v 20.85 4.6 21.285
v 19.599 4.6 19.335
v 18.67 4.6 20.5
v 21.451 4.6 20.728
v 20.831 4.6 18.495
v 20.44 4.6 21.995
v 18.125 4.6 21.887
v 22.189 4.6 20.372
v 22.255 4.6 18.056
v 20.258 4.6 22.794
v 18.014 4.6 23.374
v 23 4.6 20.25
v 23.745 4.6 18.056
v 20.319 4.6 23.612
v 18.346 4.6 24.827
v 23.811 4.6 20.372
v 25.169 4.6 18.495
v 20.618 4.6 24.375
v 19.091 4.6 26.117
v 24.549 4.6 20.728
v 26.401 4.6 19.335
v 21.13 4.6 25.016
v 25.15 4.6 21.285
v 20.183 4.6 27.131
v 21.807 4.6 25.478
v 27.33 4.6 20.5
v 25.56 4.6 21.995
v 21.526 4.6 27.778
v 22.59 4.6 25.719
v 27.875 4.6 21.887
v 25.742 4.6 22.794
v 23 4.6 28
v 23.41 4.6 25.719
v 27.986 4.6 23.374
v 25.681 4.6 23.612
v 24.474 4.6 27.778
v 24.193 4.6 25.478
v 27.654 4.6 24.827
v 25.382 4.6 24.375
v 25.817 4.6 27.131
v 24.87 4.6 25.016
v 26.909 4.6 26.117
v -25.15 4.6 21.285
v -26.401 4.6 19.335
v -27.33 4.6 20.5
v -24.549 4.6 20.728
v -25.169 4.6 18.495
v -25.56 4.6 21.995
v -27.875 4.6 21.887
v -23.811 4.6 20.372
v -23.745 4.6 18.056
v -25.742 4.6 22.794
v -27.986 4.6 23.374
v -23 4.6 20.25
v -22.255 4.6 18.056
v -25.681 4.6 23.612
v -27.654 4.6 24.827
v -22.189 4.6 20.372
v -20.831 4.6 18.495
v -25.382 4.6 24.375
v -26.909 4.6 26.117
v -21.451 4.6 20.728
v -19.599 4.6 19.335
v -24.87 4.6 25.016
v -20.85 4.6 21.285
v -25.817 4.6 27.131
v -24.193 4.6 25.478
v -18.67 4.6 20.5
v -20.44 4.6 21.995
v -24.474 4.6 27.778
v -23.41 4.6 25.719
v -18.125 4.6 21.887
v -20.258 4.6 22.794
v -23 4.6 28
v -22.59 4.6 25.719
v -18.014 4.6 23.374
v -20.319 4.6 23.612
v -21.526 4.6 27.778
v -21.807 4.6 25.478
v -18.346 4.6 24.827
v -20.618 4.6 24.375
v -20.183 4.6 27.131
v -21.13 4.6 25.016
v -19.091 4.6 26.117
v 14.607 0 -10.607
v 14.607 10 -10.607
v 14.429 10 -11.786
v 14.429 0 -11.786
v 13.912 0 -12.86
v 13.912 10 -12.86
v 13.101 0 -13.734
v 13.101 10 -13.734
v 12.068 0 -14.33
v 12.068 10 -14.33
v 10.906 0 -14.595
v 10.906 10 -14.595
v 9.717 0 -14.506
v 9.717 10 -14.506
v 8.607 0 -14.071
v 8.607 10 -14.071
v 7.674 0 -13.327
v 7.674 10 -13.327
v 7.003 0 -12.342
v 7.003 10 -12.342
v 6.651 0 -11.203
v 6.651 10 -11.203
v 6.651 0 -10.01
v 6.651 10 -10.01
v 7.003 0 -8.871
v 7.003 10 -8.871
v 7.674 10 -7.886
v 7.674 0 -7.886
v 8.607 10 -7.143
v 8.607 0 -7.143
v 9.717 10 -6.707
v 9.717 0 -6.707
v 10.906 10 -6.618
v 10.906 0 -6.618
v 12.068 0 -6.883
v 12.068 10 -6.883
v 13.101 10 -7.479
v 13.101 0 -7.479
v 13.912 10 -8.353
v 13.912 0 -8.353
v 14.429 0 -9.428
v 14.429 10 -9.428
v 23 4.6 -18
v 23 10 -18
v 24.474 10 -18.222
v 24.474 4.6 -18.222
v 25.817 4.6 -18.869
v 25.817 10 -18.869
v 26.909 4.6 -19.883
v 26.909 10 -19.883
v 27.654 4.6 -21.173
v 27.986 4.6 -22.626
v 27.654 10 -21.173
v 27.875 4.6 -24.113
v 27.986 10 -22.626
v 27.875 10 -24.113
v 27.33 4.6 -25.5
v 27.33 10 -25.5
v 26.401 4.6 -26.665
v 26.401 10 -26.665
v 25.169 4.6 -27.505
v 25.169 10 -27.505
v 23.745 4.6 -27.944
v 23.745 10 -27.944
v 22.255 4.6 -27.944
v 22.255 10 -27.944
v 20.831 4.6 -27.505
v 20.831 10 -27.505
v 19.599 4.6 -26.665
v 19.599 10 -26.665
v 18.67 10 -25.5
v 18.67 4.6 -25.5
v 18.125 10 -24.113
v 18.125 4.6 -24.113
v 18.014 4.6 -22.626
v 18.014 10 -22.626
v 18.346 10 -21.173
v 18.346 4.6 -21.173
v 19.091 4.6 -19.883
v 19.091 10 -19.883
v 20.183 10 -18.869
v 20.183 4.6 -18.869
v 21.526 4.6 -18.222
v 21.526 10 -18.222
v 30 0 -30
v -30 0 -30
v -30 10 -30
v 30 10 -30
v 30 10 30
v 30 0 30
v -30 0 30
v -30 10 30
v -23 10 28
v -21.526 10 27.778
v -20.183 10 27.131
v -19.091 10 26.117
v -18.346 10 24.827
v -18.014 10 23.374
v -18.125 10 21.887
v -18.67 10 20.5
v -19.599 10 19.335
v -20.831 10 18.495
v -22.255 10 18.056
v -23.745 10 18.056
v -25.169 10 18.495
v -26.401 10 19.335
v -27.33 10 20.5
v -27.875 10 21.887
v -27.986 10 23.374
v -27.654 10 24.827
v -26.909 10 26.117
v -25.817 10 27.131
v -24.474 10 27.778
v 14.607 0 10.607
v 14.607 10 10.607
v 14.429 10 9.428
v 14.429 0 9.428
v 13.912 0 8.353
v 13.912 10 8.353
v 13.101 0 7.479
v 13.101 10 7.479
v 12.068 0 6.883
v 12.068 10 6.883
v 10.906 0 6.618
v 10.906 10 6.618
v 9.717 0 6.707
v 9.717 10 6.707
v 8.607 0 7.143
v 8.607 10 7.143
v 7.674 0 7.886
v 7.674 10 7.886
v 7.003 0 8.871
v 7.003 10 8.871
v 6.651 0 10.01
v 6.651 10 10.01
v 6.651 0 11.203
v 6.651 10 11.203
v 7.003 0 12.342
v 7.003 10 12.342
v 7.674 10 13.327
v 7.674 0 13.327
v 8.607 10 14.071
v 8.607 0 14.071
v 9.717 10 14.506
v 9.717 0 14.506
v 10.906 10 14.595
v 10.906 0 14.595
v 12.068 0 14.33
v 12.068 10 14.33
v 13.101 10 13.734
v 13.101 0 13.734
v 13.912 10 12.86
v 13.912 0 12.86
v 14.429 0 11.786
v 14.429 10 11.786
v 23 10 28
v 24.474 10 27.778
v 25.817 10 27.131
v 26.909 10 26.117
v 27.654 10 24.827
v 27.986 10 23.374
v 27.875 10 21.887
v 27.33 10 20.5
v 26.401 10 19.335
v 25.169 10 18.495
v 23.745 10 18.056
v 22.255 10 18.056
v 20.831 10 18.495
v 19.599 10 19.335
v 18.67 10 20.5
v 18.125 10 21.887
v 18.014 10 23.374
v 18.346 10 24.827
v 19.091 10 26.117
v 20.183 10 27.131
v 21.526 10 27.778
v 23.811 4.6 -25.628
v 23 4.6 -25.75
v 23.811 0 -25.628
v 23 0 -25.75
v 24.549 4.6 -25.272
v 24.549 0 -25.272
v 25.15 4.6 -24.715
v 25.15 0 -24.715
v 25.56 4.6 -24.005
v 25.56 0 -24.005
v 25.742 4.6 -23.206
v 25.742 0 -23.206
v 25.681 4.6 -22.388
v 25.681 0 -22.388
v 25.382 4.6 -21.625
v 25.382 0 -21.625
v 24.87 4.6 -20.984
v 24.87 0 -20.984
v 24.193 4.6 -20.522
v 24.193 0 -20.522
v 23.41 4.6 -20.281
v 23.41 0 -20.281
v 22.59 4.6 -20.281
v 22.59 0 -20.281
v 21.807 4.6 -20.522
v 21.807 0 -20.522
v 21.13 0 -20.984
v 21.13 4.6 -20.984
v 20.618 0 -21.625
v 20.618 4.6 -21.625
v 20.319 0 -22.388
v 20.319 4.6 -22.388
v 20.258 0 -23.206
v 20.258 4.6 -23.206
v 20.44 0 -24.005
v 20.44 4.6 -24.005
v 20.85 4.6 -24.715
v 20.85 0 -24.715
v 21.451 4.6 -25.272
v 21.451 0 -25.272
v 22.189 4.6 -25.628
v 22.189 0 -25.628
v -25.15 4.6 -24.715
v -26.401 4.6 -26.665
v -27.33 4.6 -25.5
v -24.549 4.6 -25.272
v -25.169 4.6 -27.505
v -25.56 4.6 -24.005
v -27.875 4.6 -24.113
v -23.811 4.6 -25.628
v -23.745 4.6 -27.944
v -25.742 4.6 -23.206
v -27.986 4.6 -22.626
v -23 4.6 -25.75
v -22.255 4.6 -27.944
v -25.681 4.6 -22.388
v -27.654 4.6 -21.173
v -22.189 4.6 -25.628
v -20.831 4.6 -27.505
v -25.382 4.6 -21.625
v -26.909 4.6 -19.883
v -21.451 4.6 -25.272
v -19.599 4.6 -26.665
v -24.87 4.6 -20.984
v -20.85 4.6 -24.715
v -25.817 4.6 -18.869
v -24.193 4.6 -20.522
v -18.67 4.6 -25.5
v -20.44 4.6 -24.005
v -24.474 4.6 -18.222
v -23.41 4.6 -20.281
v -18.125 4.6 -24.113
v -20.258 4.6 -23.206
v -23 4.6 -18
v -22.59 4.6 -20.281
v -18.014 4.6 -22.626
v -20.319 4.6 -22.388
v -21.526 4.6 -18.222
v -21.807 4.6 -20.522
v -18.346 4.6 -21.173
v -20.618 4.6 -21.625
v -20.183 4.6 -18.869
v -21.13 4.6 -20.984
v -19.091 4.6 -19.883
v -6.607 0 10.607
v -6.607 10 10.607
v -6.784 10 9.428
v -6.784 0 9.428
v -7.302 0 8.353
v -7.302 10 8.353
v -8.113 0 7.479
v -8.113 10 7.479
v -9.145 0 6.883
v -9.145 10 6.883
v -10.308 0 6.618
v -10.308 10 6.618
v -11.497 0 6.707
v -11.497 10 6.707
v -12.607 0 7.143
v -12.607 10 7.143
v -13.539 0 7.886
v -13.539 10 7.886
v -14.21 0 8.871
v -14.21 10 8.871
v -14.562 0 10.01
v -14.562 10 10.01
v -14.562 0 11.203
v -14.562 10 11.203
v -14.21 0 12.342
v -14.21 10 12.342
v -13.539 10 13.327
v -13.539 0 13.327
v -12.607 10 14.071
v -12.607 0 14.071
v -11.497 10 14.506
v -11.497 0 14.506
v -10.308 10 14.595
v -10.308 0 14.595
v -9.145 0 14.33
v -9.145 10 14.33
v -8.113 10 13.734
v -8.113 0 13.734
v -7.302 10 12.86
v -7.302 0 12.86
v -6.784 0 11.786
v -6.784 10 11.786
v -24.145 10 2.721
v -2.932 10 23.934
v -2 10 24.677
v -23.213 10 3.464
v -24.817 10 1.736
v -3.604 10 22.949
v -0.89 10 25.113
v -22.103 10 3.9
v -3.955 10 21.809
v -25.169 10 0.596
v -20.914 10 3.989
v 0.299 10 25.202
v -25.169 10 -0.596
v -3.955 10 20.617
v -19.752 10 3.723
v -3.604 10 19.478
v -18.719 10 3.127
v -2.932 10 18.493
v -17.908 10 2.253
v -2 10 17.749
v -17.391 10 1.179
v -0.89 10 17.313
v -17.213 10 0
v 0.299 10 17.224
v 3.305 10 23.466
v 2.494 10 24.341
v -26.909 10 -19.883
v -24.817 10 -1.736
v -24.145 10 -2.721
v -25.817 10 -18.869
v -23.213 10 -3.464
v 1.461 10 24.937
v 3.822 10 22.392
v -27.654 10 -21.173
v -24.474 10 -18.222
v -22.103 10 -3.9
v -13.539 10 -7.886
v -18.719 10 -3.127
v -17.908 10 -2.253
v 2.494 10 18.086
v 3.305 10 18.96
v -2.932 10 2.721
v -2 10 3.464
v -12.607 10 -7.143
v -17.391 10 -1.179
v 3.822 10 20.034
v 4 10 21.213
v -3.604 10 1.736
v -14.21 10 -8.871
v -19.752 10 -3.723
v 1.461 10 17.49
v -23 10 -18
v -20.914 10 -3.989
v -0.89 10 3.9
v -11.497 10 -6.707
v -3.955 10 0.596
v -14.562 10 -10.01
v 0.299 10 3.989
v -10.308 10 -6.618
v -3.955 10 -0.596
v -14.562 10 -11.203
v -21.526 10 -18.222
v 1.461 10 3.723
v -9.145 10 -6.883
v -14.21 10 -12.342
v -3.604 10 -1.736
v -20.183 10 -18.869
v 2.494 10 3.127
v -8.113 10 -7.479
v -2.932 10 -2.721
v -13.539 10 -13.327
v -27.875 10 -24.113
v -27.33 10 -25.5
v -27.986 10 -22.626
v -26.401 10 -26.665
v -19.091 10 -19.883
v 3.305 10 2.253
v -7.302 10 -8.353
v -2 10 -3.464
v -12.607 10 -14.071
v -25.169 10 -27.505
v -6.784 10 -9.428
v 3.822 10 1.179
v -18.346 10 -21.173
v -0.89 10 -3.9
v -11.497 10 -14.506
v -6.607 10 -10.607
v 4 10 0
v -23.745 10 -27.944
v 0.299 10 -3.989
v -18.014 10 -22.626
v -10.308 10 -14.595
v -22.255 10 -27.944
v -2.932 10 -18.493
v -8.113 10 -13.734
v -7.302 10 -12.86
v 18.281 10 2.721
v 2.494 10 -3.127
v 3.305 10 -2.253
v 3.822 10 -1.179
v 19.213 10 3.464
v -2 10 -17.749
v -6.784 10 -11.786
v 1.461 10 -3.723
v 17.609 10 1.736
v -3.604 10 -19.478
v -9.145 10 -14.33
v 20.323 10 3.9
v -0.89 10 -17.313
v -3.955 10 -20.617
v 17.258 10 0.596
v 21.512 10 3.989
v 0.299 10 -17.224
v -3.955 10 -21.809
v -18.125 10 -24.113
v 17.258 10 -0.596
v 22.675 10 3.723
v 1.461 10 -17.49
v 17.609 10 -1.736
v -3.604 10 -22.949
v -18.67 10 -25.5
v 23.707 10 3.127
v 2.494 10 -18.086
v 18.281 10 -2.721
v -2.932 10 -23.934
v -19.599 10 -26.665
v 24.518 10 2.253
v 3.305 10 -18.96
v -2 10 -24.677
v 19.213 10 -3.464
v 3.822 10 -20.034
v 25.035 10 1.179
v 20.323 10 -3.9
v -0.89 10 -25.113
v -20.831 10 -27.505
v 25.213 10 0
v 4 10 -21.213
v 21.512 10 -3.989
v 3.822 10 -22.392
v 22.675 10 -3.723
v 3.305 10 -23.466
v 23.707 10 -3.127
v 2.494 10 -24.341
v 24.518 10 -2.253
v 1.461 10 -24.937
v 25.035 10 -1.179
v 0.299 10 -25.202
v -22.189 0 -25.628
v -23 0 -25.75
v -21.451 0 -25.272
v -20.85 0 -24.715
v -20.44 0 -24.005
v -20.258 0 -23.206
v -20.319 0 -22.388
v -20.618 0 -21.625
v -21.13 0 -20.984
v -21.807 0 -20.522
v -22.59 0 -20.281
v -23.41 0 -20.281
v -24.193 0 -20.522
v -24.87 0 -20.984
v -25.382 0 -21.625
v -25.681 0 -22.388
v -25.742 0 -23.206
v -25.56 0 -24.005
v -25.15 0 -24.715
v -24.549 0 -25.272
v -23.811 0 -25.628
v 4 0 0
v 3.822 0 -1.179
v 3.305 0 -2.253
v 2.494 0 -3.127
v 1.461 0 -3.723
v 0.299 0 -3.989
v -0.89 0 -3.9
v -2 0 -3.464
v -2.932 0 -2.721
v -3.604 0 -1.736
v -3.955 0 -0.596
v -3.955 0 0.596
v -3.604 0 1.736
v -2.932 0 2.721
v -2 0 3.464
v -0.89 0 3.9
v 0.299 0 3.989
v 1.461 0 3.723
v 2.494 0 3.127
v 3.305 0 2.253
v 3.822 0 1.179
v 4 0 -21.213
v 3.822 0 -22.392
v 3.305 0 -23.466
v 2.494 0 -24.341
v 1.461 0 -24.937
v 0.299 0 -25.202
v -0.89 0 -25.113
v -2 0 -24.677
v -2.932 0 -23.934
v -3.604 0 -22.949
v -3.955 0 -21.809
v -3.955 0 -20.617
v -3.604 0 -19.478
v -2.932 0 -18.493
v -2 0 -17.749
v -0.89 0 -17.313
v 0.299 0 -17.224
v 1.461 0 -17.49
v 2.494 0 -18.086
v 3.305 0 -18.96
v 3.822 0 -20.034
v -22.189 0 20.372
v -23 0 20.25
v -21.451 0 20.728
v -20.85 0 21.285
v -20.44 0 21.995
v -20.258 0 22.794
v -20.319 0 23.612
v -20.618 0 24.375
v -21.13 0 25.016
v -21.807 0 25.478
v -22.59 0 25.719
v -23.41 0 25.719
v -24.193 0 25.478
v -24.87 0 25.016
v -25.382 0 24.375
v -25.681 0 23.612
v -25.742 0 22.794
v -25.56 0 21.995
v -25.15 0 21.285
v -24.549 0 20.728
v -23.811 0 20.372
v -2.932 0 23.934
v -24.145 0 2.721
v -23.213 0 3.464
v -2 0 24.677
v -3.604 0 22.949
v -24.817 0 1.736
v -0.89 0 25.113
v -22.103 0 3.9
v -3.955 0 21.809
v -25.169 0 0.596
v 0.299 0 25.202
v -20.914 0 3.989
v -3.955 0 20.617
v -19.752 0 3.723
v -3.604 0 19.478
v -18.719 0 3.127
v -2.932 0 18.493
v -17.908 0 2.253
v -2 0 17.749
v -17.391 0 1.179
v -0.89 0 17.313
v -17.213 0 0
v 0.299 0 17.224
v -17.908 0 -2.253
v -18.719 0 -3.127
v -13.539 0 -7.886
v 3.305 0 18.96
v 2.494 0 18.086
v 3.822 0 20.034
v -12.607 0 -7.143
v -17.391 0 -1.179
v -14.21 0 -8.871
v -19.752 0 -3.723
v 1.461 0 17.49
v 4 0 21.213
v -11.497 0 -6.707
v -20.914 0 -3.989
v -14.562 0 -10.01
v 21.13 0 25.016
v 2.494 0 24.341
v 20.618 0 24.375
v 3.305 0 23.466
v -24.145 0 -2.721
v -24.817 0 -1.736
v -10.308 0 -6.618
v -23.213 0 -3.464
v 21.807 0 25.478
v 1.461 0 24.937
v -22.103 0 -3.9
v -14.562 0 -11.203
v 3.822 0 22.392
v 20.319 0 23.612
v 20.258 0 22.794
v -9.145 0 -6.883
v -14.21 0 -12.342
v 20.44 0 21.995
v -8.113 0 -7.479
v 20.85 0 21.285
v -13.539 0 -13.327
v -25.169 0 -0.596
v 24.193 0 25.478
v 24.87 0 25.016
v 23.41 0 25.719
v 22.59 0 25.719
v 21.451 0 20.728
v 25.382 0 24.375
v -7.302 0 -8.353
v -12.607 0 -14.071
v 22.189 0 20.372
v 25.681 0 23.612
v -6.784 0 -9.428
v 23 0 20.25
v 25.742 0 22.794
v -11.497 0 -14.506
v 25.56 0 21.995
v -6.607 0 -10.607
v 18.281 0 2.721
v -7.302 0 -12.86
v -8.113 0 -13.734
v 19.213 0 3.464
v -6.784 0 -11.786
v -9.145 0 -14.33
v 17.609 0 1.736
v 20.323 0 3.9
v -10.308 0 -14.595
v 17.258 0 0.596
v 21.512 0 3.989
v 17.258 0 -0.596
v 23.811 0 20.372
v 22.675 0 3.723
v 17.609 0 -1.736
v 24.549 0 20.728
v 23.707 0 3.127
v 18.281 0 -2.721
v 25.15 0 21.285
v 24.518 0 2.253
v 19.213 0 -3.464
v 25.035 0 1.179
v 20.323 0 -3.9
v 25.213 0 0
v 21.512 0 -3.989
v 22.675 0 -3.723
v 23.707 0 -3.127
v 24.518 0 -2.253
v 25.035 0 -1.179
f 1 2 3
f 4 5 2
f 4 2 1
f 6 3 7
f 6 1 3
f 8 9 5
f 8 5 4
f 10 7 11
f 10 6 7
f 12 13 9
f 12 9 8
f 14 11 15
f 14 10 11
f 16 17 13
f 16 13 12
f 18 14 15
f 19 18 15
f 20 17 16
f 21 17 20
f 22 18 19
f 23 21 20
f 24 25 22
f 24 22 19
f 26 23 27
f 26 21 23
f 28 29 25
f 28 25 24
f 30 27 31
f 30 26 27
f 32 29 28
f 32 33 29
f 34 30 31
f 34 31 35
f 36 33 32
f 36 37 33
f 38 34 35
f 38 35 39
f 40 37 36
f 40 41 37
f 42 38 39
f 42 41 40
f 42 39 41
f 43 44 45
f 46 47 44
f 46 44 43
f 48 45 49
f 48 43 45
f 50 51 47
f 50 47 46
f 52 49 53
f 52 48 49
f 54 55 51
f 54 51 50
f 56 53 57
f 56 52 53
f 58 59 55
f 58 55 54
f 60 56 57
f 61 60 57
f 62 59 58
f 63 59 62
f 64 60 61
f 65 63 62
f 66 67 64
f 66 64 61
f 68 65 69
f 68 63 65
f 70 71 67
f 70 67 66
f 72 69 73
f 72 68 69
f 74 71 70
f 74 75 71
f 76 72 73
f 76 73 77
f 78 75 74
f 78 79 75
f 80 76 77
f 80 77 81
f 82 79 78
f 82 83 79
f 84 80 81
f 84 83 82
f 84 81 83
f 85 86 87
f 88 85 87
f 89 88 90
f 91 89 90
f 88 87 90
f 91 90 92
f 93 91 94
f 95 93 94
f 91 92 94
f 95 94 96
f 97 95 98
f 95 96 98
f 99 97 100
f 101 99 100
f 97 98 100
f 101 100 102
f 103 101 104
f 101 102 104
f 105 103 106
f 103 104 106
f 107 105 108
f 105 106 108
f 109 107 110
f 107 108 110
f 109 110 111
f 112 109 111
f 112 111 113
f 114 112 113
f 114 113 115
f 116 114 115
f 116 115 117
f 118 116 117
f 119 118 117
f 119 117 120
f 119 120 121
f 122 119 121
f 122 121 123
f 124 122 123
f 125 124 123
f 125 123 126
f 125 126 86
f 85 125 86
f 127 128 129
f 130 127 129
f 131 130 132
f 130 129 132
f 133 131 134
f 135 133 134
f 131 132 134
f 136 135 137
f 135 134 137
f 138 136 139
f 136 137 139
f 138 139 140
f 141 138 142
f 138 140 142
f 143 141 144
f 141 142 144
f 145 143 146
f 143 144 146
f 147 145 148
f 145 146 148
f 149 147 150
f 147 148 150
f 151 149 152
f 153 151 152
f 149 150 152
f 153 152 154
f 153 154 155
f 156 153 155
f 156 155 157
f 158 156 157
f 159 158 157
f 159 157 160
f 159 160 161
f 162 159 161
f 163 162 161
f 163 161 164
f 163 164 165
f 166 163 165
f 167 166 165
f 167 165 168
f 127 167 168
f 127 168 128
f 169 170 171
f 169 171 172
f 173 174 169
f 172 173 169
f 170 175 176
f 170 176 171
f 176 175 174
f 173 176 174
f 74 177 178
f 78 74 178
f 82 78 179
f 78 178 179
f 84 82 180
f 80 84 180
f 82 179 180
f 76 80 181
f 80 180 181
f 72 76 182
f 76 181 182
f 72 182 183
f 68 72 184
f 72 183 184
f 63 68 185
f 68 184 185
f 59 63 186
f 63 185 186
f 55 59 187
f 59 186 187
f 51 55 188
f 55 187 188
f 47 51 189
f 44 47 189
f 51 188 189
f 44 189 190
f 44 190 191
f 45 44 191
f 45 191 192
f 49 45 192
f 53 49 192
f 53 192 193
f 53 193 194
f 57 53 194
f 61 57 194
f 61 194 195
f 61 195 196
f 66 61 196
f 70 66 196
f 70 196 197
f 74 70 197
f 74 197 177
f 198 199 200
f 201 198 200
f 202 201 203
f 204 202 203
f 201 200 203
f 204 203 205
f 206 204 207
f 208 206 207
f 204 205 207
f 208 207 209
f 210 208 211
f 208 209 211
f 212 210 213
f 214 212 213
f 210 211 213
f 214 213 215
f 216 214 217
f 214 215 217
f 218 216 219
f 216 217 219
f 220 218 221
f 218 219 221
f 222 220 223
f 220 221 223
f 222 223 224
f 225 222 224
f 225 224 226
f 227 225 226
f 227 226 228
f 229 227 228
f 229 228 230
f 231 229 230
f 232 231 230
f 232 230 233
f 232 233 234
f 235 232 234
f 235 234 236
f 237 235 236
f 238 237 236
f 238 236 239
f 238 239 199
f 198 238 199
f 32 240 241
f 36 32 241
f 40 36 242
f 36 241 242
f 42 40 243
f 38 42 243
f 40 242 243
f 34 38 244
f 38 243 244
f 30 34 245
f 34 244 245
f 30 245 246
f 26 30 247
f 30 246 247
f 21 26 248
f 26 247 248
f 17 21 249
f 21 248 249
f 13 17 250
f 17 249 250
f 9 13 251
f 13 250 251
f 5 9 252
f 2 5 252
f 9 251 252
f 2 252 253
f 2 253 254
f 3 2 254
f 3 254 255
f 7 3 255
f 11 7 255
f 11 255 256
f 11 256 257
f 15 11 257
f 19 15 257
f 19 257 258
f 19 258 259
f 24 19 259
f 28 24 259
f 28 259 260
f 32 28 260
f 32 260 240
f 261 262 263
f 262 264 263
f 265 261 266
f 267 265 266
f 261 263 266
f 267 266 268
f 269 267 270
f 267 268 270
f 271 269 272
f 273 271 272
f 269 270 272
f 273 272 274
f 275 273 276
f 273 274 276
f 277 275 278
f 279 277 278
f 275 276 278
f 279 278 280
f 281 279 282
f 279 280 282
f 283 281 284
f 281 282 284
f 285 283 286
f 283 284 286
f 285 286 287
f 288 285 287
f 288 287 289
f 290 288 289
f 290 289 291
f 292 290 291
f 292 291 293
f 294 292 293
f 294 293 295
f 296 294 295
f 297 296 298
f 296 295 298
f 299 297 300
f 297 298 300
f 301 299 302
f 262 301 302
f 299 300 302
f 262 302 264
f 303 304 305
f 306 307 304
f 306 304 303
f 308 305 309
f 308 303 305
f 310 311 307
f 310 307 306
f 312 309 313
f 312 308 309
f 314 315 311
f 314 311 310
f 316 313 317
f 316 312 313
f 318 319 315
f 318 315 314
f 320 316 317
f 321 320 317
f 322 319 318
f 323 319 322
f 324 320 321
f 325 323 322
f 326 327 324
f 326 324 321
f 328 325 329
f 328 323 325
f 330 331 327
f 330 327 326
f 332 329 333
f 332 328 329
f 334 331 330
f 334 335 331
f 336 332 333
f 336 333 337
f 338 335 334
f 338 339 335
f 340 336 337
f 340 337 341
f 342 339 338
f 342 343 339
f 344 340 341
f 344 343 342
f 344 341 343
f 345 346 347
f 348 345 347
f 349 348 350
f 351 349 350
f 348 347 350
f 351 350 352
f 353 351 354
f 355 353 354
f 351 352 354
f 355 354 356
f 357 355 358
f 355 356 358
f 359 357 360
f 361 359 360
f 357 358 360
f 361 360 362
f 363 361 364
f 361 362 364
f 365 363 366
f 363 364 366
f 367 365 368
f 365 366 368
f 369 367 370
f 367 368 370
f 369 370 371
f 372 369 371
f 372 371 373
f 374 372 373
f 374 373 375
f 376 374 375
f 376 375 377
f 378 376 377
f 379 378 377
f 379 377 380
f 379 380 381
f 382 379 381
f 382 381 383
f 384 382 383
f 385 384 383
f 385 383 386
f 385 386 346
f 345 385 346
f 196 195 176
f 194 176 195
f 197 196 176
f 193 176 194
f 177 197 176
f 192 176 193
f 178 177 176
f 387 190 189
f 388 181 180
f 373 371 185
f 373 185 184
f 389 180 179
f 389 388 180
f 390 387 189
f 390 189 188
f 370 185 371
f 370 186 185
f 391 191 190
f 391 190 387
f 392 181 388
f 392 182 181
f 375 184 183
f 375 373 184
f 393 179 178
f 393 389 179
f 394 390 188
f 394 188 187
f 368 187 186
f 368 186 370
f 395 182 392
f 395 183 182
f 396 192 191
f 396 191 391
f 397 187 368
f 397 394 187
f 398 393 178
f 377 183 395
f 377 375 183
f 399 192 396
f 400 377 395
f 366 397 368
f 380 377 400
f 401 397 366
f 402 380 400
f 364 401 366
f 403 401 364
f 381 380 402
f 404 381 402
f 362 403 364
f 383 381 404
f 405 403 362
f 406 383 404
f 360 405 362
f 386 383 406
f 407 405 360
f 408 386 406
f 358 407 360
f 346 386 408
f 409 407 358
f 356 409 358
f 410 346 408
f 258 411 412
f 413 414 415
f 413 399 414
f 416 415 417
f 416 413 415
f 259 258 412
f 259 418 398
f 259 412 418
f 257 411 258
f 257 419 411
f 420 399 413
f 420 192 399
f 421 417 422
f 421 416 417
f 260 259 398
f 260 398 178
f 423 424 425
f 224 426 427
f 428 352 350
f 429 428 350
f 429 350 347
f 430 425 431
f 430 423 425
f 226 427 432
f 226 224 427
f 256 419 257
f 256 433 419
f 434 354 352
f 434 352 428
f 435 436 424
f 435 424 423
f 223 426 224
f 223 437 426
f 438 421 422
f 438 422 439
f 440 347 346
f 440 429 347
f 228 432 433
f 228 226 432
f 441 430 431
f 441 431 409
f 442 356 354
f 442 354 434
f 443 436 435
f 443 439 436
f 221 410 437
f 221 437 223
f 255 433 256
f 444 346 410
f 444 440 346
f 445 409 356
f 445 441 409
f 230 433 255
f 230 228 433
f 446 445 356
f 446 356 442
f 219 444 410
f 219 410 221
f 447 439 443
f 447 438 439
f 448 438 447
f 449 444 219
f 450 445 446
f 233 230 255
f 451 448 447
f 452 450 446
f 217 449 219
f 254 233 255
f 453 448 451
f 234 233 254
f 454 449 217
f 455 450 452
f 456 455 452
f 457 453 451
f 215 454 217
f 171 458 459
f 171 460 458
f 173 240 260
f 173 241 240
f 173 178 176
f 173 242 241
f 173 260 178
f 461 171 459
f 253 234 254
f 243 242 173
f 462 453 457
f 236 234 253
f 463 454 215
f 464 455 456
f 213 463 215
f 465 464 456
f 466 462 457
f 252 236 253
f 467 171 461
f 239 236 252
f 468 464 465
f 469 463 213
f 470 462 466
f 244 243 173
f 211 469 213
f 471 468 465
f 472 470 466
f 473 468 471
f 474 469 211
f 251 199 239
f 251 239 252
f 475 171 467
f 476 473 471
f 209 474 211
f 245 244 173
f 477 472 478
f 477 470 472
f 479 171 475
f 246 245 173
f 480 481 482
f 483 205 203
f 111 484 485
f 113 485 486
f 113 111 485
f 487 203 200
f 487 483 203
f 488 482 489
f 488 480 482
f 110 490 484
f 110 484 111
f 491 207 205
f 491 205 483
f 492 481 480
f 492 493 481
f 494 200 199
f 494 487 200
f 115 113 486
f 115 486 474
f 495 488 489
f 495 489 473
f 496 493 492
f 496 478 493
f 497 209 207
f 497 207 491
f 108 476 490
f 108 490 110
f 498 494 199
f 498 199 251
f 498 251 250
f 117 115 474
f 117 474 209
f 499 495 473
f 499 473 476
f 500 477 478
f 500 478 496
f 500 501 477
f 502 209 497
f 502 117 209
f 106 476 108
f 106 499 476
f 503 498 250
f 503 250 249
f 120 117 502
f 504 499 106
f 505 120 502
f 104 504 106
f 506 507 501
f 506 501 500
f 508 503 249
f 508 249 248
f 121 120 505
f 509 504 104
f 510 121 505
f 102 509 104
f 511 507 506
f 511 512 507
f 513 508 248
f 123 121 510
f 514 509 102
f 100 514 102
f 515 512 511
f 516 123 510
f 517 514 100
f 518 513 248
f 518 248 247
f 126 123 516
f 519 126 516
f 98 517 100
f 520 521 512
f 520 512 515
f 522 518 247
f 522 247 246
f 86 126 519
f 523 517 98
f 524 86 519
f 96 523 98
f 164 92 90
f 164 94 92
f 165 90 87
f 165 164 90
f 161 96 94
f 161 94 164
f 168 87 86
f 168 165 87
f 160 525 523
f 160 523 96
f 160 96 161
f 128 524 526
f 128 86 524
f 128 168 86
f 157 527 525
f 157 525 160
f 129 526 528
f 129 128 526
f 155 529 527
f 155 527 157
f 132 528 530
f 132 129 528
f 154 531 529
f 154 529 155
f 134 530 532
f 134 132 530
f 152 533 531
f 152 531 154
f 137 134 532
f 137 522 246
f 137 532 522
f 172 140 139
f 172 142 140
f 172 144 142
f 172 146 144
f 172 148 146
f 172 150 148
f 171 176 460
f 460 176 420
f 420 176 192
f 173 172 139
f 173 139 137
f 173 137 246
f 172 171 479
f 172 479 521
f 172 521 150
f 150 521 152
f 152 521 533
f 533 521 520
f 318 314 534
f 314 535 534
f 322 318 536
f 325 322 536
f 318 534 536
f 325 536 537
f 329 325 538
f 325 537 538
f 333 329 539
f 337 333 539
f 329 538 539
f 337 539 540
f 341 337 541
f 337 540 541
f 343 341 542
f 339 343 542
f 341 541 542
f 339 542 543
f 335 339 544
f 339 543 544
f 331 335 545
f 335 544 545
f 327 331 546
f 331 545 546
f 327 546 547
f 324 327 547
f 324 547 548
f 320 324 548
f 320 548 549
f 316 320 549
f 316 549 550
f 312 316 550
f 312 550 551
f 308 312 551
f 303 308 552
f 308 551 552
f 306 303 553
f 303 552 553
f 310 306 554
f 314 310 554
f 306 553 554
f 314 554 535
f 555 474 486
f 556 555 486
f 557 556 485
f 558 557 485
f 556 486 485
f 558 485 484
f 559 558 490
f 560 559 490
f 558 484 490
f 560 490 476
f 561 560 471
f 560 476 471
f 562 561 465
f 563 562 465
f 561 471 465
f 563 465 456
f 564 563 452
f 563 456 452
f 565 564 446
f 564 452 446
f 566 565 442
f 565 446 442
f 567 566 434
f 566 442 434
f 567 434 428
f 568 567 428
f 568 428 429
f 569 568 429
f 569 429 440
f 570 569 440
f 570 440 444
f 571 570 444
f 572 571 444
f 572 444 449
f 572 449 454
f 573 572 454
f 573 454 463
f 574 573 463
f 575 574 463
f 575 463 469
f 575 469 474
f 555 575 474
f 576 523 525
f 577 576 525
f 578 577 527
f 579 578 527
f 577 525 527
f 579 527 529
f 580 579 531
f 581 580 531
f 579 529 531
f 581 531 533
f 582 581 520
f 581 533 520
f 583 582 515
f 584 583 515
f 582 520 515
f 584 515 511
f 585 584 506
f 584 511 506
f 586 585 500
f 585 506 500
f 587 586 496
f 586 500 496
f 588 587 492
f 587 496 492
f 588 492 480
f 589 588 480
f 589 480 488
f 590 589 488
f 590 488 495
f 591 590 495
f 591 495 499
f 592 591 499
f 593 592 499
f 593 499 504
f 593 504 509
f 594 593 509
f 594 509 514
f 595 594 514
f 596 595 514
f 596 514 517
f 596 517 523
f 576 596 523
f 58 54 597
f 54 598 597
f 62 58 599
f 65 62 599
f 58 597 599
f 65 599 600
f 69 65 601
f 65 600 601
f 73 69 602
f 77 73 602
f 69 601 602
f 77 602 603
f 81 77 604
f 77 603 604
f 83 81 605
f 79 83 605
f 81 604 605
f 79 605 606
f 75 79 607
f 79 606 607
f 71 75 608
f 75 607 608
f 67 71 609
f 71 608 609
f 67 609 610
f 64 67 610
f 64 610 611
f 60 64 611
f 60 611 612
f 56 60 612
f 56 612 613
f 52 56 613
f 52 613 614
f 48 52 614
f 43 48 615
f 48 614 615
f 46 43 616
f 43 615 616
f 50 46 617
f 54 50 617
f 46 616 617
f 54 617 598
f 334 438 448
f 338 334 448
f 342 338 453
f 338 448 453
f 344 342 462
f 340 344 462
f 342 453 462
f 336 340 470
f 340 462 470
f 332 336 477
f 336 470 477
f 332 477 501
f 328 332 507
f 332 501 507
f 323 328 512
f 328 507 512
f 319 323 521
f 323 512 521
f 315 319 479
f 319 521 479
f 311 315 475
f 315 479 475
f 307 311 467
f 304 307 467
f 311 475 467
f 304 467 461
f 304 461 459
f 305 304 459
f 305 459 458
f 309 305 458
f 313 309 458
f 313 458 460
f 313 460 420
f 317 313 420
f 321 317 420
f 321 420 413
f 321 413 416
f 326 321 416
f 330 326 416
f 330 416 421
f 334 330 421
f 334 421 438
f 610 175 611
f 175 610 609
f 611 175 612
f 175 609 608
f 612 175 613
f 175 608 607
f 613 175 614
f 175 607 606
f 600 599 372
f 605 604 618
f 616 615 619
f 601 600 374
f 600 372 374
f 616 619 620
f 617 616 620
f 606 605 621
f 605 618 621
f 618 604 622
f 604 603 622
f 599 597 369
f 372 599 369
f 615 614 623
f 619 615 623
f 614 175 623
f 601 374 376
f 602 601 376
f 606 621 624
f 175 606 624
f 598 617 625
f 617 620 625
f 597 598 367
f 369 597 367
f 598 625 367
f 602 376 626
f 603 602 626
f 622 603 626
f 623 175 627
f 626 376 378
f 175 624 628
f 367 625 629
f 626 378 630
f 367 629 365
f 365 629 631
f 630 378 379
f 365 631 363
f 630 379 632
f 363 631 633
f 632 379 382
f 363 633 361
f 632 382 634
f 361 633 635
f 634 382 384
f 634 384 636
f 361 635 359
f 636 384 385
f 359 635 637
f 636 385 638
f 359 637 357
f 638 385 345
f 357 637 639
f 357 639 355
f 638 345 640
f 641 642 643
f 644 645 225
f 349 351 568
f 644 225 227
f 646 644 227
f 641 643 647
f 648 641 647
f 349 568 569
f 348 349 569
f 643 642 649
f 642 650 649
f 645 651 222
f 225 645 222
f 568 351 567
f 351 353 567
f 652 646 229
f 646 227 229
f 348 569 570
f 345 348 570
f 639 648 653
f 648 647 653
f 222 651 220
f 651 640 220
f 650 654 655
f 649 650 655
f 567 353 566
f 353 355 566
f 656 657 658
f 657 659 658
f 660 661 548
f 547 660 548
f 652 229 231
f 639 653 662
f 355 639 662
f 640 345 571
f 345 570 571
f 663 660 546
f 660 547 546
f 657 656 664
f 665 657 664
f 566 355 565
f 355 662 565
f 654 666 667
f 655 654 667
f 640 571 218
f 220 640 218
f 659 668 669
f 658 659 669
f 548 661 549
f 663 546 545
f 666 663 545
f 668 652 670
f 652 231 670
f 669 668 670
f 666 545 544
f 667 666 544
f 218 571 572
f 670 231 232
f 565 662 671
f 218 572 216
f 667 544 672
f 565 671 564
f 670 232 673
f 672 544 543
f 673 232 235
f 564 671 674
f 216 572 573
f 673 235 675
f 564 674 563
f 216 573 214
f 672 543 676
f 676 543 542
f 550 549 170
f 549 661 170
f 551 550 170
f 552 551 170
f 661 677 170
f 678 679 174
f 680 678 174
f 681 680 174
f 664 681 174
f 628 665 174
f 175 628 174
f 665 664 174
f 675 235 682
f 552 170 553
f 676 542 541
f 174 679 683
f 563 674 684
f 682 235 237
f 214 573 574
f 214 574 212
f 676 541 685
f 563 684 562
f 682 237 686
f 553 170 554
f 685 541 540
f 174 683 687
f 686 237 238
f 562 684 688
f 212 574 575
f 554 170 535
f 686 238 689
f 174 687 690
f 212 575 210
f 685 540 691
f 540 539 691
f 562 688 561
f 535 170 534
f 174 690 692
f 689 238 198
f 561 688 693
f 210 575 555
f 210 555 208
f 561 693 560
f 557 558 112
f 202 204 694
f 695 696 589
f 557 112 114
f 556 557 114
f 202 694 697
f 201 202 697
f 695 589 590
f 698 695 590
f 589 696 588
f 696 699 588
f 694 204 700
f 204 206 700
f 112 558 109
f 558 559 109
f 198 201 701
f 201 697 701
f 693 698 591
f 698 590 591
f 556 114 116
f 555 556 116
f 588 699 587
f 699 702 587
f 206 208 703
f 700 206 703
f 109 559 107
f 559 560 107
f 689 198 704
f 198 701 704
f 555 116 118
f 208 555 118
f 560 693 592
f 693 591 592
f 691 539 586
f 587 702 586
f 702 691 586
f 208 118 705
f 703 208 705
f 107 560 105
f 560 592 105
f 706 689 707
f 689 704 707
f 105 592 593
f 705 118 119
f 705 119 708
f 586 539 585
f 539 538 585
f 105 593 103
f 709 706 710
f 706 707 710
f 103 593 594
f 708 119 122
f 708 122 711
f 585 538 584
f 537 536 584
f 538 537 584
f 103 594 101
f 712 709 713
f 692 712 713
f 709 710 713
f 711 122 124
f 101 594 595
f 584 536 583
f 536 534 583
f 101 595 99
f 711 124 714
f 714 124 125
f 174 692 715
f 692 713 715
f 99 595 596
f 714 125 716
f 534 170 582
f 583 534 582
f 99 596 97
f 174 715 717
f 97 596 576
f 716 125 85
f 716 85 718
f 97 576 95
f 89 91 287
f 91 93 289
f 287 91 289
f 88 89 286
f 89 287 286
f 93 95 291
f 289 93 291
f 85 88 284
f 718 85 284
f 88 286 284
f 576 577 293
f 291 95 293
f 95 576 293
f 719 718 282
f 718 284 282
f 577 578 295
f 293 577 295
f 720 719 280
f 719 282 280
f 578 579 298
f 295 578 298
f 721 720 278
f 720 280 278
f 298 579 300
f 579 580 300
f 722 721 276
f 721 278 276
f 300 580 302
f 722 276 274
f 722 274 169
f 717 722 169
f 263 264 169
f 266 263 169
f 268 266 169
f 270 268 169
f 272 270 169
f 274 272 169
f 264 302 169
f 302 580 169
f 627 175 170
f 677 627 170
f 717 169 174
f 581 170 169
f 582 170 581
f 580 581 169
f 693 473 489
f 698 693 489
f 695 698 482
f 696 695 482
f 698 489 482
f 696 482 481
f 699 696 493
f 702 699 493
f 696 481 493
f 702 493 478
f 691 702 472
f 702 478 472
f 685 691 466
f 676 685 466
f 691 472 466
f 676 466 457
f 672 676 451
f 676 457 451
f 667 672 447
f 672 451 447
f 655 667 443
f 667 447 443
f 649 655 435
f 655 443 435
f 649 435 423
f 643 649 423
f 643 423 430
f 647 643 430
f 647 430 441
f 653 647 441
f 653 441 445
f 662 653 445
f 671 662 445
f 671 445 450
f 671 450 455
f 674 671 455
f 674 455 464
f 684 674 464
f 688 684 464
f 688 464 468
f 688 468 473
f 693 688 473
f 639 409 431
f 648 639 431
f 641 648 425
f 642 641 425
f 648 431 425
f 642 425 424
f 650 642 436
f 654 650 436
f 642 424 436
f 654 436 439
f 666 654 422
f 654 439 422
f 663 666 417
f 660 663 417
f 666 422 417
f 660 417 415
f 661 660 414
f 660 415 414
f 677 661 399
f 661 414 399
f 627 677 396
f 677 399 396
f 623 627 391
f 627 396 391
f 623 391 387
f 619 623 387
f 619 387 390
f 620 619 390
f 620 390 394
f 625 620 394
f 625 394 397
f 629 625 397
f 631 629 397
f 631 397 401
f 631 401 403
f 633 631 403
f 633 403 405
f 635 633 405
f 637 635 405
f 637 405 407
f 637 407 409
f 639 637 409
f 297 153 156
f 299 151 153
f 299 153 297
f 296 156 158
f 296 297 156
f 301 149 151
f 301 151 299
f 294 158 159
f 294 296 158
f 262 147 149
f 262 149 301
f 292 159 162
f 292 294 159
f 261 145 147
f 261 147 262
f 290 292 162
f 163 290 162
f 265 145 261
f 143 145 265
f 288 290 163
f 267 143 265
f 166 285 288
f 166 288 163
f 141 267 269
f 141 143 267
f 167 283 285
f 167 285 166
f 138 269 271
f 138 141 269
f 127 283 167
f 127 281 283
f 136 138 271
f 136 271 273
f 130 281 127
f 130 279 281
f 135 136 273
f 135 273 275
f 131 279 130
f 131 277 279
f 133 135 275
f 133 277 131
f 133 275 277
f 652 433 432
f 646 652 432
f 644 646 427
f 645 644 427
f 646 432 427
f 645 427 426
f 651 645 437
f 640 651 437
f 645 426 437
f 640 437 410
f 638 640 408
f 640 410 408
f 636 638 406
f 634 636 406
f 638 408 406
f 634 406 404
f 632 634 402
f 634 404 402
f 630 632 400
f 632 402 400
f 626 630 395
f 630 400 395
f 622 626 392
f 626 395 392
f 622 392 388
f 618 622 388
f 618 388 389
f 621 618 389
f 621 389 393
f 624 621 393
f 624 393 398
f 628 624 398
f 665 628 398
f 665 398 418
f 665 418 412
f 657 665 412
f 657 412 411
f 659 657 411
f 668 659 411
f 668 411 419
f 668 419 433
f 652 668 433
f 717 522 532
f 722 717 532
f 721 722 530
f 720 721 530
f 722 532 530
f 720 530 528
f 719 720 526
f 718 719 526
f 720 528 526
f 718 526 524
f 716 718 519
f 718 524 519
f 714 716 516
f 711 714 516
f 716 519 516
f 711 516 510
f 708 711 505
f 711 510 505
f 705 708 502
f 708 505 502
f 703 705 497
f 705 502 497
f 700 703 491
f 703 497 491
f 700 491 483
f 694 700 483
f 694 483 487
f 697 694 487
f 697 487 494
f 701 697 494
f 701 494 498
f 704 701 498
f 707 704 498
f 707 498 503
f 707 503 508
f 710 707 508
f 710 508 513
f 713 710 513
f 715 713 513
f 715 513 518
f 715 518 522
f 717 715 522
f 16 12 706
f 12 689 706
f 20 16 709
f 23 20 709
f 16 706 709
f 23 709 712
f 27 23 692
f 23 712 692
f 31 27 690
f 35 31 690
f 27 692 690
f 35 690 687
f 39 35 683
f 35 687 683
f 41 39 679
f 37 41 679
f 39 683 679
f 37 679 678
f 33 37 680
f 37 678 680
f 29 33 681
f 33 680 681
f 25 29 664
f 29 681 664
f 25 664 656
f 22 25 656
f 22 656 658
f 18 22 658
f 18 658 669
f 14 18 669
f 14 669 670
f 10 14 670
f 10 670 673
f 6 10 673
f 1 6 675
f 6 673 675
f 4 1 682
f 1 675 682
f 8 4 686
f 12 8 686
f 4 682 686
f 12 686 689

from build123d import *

# Parameters (mm, degrees)
CROQUIS1_W                                           = 60
CROQUIS1_H                                           = 60
SALIENTE_EXTRUIR1_DEPTH                              = 10
CROQUIS3_R                                           = 4
CORTAR_EXTRUIR2_DEPTH                                = 11
MATRIZL1_COUNT                                       = 3
MATRIZL1_PITCH                                       = 15
MATRIZL1_COUNT_DIR2                                  = 3
MATRIZL1_PITCH_DIR2                                  = 15
REFRENTADO_PARA_TORNILLO_CON_CABEZA_HUEC_D           = 5.5
REFRENTADO_PARA_TORNILLO_CON_CABEZA_HUEC_CBORE_D     = 10
REFRENTADO_PARA_TORNILLO_CON_CABEZA_HUEC_CBORE_DEPTH = 5.4


with BuildPart() as part:
    # Croquis1 → Saliente-Extruir1 (new body)
    with BuildSketch(Plane(origin=(0, 0, 0), x_dir=(1, 0, 0), z_dir=(0, 1, 0))):
        Rectangle(CROQUIS1_W, CROQUIS1_H)
    extrude(amount=SALIENTE_EXTRUIR1_DEPTH)

    # Croquis3 → Cortar-Extruir2 (cut, through all)
    with BuildSketch(Plane(origin=(0, 10, 0), x_dir=(1, 0, 0), z_dir=(0, 1, 0))):
        with Locations((0, -21.213203436)):
            Circle(CROQUIS3_R)
    cortar_extruir2 = extrude(amount=-CORTAR_EXTRUIR2_DEPTH, mode=Mode.SUBTRACT)

    # MatrizL1: Cortar-Extruir2 3 × 3
    with Locations(*[Vector(0.707106781, 0, -0.707106781) * (i * MATRIZL1_PITCH) + Vector(-0.707106781, 0, -0.707106781) * (j * MATRIZL1_PITCH_DIR2) for i in range(MATRIZL1_COUNT) for j in range(MATRIZL1_COUNT_DIR2) if (i, j) != (0, 0)]):
        add(cortar_extruir2, mode=Mode.SUBTRACT)

    # Refrentado para tornillo con cabeza hueca de M51 (through all)
    with Locations(Plane(origin=(-23, 10, -23), x_dir=(0, 0, 1), z_dir=(0, 1, 0))):
        with Locations((0, 0), (0, 46), (46, 46), (46, 0)):
            CounterBoreHole(REFRENTADO_PARA_TORNILLO_CON_CABEZA_HUEC_D / 2, REFRENTADO_PARA_TORNILLO_CON_CABEZA_HUEC_CBORE_D / 2, REFRENTADO_PARA_TORNILLO_CON_CABEZA_HUEC_CBORE_DEPTH)


solid = part.part
